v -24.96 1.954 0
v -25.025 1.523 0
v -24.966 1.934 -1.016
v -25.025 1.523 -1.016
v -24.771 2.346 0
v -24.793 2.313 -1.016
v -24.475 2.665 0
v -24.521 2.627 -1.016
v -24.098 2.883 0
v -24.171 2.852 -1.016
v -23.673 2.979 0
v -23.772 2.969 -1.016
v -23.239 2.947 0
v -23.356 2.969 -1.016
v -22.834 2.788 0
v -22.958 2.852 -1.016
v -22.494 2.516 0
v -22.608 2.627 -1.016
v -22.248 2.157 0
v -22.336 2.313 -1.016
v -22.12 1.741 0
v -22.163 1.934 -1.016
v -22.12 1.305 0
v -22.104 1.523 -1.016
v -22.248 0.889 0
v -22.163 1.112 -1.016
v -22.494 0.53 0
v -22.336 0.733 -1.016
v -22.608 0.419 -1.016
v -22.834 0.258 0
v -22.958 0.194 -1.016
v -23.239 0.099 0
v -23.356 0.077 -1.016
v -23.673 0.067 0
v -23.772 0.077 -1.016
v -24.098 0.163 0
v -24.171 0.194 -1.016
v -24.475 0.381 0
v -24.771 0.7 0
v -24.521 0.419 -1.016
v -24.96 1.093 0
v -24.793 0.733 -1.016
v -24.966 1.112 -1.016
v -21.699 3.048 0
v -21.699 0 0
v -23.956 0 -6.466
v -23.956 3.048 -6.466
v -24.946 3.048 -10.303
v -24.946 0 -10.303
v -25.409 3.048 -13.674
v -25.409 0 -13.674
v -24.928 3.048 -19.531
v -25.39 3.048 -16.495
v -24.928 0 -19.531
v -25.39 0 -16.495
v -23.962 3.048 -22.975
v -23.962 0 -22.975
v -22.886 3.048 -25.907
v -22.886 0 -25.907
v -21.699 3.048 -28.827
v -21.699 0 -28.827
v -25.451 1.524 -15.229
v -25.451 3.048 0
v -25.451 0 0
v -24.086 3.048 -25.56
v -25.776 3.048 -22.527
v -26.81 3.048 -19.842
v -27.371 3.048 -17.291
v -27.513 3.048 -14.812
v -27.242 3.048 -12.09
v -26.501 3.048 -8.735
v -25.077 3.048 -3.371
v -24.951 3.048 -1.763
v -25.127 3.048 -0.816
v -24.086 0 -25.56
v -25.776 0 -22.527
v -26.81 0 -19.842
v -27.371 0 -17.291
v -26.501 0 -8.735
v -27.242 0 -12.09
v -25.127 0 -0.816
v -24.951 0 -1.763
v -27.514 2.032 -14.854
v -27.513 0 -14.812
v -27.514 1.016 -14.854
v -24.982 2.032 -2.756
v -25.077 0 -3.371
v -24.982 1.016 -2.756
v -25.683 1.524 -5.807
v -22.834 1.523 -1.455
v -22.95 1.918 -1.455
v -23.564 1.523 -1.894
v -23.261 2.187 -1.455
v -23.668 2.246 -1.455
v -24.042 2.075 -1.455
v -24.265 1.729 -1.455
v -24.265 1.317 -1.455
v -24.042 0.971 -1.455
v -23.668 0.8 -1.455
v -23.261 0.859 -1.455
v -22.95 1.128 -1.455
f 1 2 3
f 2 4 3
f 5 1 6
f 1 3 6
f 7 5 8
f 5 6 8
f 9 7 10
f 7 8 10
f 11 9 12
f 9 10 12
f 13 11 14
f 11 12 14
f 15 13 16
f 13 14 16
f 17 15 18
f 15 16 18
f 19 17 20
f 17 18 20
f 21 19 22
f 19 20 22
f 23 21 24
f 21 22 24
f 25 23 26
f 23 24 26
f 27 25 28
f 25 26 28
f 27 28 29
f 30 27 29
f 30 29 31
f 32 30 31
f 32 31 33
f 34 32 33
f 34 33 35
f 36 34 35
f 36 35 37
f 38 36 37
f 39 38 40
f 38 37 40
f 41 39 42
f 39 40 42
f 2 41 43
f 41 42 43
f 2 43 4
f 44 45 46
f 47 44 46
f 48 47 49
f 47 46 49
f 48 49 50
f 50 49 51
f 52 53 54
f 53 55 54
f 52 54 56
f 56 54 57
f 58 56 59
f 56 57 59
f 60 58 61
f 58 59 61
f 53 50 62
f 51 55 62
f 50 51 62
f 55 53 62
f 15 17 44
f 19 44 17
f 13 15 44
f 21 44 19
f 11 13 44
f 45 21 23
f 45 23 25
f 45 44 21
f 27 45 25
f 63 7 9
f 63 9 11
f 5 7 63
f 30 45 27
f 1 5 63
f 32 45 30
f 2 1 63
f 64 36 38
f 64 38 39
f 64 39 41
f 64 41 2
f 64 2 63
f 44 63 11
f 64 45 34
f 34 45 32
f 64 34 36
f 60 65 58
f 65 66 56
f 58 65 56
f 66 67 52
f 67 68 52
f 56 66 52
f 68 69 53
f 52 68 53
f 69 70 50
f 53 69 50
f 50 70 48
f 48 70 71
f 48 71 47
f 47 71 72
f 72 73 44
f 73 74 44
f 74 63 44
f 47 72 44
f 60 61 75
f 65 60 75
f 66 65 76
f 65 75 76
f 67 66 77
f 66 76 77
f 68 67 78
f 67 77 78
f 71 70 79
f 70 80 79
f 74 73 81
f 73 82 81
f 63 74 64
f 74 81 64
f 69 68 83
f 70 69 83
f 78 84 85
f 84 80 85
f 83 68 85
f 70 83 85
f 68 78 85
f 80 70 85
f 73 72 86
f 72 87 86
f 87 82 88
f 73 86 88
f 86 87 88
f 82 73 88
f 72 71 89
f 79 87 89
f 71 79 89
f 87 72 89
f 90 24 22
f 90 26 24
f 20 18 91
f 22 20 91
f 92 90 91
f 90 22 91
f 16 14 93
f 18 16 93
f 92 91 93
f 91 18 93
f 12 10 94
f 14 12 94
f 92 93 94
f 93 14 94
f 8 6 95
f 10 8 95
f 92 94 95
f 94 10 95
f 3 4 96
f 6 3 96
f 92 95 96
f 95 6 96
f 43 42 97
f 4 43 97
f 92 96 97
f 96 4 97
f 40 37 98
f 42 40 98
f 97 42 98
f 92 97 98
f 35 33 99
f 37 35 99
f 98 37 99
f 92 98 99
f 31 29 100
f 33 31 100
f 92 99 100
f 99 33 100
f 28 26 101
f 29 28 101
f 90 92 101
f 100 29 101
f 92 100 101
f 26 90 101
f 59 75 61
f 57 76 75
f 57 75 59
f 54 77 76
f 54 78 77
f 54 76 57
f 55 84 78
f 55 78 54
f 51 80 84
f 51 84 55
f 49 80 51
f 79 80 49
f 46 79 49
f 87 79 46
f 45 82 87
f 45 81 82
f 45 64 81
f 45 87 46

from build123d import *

# Parameters (mm, degrees)
F1_DEPTH = 3.048
F3_D     = 2.921
F3_DEPTH = 1.016
F3_TIP   = 0.8775569341


with BuildPart() as f1:
    # F0 (on Front) → F1 (new body)
    with BuildSketch(Plane.XZ):
        with BuildLine():
            Line((-21.6993894428, 0), (-25.4505686462, 0))
            add(Edge.make_bspline(
                [(-21.6993894428, -28.827091679), (-25.2311042814, -24.4833256454), (-29.7758519742, -15.7339199693), (-24.2763052364, -3.0663705603), (-25.1012646916, -0.7538146359), (-25.4505686462, 0)],
                knots=[0, 0, 0, 0, 0.4285398251, 0.815806467, 1, 1, 1, 1], degree=3))
            add(Edge.make_bspline(
                [(-21.6993894428, 0), (-23.6090284447, -5.1525288357), (-27.3296754836, -15.1914634907), (-23.5426882621, -24.3629246442), (-21.6993894428, -28.827091679)],
                knots=[0, 0, 0, 0, 0.5132545447, 1, 1, 1, 1], degree=3))
        make_face()
    extrude(amount=-F1_DEPTH)

    # F3
    with Locations(Plane.XY):
        with Locations((-23.564230947, 1.5230104046)):
            Hole(F3_D / 2, depth=F3_DEPTH)
            with Locations((0, 0, -(F3_DEPTH + F3_TIP / 2))):  # 118° drill point
                Cone(0, F3_D / 2, F3_TIP, mode=Mode.SUBTRACT)


solid = f1.part
